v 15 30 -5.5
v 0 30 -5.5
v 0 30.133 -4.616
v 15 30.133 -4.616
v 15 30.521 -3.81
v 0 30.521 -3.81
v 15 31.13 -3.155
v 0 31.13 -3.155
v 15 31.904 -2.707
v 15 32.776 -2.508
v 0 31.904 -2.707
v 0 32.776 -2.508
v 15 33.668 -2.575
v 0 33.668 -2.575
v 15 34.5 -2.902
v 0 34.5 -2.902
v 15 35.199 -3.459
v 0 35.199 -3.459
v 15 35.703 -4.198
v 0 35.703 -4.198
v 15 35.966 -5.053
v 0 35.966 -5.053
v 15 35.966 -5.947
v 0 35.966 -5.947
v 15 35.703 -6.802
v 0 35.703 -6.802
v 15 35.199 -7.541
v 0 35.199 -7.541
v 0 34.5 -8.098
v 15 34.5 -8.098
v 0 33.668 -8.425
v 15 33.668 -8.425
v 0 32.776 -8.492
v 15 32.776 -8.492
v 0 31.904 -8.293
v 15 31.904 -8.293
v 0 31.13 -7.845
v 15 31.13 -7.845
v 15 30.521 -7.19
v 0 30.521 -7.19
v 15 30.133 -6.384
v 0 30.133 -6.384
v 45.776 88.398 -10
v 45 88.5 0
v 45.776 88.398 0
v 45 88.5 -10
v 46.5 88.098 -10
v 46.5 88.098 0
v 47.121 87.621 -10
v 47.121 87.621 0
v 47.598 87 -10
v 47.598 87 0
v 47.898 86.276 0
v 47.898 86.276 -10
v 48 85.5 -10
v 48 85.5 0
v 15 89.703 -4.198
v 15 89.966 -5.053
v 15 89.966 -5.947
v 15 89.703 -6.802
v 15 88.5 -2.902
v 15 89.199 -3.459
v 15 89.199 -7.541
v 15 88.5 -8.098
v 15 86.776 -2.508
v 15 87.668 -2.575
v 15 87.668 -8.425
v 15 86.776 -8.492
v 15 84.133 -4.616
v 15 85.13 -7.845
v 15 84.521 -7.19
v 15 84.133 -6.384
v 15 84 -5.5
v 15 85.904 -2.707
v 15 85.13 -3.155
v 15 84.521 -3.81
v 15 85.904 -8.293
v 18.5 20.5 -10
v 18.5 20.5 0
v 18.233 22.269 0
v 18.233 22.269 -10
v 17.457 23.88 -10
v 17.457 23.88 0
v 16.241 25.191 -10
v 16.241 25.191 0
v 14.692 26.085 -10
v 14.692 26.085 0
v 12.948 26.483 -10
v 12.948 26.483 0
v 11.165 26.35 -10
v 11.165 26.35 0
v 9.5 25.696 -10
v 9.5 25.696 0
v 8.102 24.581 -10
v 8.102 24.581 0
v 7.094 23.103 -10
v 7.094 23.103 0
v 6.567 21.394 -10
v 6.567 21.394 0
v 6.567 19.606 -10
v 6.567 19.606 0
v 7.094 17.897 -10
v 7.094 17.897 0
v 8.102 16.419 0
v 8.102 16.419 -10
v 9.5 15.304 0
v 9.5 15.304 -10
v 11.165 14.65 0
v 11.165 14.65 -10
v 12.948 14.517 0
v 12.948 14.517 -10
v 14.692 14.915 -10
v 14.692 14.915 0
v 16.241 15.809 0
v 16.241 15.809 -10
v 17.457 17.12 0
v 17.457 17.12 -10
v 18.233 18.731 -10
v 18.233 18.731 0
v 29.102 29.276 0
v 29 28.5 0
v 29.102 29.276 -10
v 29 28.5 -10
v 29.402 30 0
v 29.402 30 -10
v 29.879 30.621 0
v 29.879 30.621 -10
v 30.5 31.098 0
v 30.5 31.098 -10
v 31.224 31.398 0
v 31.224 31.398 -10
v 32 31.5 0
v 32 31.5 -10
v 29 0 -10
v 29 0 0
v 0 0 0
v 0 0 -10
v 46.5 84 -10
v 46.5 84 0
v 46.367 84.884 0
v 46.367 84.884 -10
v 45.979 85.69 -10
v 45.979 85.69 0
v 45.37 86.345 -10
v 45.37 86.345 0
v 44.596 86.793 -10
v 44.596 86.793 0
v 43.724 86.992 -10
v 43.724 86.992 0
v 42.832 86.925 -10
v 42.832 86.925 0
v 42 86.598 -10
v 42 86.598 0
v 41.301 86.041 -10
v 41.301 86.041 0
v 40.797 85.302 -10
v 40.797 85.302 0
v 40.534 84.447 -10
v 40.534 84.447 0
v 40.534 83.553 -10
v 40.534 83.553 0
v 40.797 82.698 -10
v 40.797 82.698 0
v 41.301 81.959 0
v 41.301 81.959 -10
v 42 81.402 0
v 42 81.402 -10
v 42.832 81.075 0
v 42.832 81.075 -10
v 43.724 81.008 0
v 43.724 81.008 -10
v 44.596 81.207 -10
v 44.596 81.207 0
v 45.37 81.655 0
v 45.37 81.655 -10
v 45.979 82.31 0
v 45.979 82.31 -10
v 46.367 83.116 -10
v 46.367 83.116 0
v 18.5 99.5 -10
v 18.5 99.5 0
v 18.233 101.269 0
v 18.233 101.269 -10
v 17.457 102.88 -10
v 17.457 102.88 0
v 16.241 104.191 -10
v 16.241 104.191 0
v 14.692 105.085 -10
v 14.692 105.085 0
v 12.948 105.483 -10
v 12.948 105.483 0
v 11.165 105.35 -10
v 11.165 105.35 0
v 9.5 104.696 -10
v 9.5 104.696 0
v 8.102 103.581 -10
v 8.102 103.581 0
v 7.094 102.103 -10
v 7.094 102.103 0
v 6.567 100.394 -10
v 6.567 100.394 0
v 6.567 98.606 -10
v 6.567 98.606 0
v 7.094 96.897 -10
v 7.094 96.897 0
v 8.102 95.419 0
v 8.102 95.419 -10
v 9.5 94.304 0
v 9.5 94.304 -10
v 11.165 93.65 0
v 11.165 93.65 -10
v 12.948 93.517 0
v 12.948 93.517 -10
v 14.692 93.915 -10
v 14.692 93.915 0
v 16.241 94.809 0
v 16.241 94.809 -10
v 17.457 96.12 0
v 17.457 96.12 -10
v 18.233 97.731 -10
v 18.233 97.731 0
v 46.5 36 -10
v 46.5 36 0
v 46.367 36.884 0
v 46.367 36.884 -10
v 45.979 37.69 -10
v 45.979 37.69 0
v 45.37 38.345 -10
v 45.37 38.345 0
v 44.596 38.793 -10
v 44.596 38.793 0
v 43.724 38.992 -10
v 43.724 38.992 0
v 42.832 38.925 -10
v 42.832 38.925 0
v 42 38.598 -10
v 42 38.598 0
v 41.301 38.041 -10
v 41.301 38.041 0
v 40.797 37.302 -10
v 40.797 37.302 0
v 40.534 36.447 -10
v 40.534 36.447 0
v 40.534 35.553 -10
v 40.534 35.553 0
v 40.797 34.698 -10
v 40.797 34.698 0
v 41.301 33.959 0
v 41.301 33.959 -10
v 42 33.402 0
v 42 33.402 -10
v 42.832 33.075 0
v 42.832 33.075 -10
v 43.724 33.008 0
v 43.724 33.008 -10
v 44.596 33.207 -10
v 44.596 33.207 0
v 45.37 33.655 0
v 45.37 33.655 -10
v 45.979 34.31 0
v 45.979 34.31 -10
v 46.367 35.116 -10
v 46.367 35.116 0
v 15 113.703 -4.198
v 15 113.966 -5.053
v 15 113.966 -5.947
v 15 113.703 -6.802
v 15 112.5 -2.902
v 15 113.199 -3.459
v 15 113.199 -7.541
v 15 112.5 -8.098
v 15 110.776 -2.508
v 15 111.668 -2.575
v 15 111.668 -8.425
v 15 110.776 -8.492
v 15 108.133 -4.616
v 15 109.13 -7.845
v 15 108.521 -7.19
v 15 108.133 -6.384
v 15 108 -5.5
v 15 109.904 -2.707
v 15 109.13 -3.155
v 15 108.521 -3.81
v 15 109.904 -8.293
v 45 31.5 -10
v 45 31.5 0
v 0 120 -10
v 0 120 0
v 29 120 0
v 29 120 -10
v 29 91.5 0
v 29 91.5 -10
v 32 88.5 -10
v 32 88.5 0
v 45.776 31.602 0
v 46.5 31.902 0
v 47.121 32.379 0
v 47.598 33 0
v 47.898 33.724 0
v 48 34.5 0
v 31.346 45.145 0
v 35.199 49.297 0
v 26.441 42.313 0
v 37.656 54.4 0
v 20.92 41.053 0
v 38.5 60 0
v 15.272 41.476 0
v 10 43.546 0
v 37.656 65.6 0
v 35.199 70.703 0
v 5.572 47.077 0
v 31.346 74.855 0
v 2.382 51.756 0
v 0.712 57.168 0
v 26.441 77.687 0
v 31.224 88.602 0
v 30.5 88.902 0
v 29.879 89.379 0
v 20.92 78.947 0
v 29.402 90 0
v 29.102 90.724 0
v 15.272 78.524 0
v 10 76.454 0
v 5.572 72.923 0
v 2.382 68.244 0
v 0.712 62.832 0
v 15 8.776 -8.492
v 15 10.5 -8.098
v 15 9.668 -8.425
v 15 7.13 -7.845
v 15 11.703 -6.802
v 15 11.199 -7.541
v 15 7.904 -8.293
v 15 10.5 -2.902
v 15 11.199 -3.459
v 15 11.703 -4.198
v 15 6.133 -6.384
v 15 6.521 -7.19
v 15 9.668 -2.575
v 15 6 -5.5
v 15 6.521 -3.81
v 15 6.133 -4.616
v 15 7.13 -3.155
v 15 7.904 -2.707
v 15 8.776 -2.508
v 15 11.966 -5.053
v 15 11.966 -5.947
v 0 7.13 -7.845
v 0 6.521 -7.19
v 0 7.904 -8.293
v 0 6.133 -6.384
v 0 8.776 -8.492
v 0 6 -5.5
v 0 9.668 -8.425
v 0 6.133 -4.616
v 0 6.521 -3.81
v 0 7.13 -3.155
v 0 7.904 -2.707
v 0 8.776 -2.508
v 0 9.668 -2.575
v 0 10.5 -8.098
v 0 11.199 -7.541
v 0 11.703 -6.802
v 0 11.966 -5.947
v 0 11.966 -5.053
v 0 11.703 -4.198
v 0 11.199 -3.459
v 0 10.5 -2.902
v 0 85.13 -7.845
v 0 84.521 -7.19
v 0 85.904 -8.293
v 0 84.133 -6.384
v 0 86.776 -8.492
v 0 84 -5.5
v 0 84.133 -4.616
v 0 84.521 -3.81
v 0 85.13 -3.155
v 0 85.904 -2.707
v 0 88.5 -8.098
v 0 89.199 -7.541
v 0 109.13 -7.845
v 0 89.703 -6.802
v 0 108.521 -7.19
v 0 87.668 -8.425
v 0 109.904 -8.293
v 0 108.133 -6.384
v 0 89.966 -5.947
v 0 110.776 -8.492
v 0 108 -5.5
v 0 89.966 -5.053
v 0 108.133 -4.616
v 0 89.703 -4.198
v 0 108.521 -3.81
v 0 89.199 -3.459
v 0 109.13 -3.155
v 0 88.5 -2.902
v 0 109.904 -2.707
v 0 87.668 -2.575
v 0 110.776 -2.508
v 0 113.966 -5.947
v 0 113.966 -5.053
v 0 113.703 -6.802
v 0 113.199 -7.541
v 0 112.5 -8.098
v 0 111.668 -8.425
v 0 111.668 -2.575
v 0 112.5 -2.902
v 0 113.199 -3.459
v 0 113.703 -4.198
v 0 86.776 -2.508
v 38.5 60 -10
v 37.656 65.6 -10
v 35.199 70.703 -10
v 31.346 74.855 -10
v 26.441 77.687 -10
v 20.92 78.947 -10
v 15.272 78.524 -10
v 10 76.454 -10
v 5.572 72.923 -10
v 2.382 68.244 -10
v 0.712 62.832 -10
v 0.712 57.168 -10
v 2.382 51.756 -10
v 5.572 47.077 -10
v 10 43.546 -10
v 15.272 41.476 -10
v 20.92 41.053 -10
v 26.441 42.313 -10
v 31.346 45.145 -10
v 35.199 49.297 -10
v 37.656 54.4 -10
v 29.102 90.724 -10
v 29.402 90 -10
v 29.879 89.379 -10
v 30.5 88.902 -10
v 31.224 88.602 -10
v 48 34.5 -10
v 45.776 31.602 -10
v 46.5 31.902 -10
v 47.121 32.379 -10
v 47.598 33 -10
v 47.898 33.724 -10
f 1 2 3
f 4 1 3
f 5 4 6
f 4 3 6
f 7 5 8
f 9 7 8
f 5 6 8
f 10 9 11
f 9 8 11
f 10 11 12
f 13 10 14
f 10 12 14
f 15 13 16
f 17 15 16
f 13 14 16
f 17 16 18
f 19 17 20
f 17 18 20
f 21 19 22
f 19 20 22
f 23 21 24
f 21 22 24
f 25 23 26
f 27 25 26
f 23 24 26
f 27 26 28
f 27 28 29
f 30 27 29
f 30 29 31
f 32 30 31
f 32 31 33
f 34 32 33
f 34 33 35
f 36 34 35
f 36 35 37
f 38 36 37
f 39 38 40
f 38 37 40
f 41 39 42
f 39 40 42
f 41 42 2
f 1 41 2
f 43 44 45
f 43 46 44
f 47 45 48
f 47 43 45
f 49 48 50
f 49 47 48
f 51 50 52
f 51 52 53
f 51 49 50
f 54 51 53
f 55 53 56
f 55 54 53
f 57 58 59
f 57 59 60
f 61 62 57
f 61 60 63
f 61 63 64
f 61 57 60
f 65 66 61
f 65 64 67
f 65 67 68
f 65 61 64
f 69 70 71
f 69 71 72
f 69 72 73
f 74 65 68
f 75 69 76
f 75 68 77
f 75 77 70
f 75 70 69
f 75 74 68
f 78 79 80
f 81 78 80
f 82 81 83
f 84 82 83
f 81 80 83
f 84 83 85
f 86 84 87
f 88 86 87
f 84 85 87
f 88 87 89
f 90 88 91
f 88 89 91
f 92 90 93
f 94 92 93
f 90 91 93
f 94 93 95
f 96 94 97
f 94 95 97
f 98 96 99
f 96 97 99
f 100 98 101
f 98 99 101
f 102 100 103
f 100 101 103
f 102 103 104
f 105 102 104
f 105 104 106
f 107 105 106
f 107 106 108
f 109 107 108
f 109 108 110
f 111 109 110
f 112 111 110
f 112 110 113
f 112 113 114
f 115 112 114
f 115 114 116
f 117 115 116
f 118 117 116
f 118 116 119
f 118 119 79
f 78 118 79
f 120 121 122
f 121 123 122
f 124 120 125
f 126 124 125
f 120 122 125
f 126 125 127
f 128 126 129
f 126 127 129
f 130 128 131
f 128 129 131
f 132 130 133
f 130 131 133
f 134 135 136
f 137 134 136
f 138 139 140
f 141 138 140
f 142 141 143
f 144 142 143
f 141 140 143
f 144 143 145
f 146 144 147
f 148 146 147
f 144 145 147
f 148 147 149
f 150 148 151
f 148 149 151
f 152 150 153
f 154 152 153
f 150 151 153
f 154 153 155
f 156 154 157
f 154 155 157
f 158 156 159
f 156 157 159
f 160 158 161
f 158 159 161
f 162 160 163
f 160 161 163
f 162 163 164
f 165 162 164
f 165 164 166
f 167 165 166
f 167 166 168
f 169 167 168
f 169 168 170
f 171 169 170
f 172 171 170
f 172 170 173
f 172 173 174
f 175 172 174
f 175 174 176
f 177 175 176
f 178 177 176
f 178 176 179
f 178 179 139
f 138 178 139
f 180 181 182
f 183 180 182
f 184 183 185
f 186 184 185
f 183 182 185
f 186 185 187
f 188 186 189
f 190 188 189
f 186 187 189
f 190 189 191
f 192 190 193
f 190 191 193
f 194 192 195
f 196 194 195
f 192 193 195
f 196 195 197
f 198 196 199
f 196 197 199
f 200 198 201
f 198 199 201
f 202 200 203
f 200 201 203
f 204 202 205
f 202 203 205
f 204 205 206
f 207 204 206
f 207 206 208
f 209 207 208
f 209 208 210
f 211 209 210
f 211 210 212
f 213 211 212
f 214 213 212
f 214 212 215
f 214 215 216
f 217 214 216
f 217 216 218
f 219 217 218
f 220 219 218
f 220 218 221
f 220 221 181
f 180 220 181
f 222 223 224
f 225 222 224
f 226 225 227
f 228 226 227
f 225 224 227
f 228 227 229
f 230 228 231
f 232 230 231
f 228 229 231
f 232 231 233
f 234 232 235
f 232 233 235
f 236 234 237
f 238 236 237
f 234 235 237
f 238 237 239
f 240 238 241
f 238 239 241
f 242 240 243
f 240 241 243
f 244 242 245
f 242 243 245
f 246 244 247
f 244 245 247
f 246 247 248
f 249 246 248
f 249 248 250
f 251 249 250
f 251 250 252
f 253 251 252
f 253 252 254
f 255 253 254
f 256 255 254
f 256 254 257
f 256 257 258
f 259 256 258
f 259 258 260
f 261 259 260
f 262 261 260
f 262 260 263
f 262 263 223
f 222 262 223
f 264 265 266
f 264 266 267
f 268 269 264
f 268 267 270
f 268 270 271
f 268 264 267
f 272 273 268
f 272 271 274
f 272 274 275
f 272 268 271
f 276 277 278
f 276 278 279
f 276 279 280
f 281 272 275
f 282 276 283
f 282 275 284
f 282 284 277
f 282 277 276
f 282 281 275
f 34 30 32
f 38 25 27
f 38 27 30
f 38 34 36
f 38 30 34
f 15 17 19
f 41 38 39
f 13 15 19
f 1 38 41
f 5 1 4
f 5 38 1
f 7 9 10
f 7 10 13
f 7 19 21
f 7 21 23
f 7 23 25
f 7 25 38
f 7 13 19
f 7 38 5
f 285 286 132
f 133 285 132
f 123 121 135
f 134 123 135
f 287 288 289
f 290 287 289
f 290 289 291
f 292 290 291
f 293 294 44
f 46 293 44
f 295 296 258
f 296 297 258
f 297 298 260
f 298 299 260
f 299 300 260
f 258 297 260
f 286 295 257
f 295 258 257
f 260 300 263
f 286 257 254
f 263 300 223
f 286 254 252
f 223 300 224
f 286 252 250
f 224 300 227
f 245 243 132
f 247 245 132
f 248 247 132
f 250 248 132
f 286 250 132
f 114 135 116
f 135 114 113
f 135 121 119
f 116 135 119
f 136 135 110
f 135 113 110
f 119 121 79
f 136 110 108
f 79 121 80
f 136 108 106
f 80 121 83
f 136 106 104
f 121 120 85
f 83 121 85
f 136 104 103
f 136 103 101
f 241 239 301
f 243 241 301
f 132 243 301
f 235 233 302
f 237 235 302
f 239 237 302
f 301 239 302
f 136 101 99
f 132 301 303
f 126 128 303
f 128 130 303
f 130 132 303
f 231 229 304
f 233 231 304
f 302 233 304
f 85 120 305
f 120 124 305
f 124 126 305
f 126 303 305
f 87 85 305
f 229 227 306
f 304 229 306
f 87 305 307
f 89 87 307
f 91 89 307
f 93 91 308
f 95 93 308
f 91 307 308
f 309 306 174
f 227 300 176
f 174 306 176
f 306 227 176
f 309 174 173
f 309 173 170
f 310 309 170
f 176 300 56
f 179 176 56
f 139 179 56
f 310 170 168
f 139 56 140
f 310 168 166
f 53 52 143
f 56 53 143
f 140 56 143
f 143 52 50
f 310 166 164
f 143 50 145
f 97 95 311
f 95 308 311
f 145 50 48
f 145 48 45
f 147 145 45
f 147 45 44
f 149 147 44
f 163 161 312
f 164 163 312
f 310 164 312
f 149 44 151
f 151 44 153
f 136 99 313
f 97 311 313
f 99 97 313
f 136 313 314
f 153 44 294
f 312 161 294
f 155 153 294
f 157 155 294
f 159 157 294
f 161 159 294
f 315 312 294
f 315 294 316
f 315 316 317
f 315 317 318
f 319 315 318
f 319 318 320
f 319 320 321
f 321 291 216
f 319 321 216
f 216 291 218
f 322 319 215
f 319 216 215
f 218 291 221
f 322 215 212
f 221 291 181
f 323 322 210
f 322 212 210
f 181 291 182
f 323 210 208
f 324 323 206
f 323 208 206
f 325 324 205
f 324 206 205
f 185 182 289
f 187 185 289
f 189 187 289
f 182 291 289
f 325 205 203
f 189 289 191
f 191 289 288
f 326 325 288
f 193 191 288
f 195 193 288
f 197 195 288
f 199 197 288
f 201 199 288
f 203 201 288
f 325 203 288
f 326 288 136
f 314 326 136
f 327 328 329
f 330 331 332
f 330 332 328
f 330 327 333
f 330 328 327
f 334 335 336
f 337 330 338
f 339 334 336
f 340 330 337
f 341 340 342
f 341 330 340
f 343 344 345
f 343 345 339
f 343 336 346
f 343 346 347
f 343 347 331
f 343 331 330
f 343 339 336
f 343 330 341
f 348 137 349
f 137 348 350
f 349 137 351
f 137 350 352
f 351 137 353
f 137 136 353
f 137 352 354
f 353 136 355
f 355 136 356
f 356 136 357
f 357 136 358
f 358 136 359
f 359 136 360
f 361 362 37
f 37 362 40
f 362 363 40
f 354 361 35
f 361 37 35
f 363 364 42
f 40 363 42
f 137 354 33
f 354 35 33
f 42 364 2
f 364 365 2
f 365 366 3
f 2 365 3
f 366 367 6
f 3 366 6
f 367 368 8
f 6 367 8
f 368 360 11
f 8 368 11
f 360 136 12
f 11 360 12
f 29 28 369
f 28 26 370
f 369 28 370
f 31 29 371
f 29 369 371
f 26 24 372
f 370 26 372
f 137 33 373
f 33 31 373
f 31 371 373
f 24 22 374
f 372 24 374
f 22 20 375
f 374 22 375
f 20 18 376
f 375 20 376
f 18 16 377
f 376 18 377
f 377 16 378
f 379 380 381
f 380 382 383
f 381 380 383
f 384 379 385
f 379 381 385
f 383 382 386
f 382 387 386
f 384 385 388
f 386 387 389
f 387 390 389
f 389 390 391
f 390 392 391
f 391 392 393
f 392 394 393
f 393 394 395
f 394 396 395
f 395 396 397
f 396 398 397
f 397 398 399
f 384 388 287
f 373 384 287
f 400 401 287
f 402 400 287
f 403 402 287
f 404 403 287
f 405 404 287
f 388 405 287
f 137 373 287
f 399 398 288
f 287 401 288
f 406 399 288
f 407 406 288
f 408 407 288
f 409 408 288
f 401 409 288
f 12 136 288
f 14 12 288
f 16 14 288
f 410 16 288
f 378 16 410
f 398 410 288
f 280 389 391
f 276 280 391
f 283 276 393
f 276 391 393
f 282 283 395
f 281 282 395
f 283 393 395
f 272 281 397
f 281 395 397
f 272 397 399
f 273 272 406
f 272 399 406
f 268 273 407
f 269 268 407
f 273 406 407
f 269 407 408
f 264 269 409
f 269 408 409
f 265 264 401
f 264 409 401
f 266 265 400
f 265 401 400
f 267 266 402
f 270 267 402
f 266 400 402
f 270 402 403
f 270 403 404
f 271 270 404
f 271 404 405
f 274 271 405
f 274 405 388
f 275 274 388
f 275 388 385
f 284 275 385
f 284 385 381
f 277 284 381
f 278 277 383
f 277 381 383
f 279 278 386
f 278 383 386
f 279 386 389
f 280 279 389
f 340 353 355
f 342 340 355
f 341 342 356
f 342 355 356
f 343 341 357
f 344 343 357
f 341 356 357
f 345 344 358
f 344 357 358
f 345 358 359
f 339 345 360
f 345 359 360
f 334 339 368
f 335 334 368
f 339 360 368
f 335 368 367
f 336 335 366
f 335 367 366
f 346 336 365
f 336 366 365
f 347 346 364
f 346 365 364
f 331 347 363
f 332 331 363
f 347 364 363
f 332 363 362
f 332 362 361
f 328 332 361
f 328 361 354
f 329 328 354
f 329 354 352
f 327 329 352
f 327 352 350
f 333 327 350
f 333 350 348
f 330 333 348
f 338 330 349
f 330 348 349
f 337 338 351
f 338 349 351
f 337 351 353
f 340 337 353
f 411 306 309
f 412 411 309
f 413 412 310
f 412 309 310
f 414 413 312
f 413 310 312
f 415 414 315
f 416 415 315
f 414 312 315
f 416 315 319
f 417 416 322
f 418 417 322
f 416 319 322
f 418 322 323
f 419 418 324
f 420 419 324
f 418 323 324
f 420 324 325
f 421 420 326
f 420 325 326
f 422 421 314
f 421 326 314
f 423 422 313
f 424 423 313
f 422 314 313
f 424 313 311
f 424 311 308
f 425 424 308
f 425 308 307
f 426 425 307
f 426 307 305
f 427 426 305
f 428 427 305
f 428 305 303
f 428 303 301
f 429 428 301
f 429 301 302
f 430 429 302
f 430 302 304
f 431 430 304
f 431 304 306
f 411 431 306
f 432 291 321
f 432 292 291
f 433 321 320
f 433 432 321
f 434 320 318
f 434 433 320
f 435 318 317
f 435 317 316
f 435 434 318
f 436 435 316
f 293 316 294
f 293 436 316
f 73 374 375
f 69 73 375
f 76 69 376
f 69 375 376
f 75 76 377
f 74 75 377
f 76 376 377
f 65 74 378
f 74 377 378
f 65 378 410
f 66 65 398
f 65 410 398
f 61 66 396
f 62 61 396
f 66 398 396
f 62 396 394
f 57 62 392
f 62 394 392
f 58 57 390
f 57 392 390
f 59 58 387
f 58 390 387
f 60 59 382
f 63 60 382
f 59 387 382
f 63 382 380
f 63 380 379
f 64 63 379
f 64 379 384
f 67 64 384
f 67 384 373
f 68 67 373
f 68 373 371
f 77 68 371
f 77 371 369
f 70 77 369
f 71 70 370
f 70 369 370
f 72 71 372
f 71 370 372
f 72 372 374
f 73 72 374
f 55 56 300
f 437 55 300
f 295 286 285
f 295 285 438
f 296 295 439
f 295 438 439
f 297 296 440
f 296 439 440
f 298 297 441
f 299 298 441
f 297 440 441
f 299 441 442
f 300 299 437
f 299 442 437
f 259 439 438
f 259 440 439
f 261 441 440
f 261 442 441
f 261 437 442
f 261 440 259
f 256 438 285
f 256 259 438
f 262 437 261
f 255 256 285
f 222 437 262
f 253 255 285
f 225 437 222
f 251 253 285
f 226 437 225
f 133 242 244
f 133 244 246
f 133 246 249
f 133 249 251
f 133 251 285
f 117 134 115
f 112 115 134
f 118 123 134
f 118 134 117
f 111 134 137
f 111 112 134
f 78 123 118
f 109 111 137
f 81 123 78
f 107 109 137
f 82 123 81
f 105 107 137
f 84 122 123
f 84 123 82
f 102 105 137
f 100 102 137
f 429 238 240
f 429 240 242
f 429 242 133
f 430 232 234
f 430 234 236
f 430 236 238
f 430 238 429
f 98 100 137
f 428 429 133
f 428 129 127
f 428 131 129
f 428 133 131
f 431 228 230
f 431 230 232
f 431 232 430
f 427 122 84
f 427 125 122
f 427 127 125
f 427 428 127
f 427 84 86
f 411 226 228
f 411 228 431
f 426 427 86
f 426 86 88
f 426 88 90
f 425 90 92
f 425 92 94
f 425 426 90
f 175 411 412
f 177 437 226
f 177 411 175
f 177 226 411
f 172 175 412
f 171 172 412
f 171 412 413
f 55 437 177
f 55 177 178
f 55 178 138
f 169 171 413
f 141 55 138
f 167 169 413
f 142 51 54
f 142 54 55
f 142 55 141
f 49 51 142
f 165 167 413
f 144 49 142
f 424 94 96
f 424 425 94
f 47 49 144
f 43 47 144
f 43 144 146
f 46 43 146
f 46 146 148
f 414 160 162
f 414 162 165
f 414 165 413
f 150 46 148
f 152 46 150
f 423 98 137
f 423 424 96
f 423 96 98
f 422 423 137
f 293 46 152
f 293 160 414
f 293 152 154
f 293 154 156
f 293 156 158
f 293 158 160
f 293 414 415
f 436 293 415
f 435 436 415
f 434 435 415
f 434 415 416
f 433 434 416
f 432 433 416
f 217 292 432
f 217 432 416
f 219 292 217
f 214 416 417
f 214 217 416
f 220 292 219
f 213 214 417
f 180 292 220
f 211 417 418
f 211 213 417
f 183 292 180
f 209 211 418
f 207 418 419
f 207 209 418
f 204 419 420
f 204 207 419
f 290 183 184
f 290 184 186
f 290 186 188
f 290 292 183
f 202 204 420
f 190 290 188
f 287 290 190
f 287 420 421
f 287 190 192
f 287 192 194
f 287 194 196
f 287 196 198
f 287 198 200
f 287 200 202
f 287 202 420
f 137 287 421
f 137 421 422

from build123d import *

# Parameters (mm, degrees)
PAD_DEPTH       = 10
SKETCH001_R     = 19
POCKET_DEPTH    = 10.001
SKETCH002_R     = 6
POCKET001_DEPTH = 10.001
FILLET_R        = 3
SKETCH003_R     = 3
POCKET002_DEPTH = 15
SKETCH004_R     = 3
POCKET003_DEPTH = 10.001


with BuildPart() as part:
    # Sketch → Pad (new body)
    with BuildSketch(Plane.XY):
        Polygon((0, 0), (0, 120), (29, 120), (29, 88.5), (48, 88.5), (48, 31.5), (29, 31.5), (29, 0), align=None)
    extrude(amount=-PAD_DEPTH)

    # Sketch001 → Pocket (cut, through all)
    with BuildSketch(Plane.XY):
        with Locations((19.5, 60)):
            Circle(SKETCH001_R)
    extrude(amount=-POCKET_DEPTH, mode=Mode.SUBTRACT)

    # Sketch002 → Pocket001 (cut, through all)
    with BuildSketch(Plane.XY):
        with Locations((12.5, 99.5)):
            Circle(SKETCH002_R)
        with Locations((12.5, 20.5)):
            Circle(SKETCH002_R)
    extrude(amount=-POCKET001_DEPTH, mode=Mode.SUBTRACT)

    # Fillet
    fillet_edges = [part.edges().sort_by_distance(p)[0] for p in [
        (29, 31.5, -5),
        (29, 88.5, -5),
        (48, 31.5, -5),
        (48, 88.5, -5),
    ]]
    fillet(fillet_edges, radius=FILLET_R)

    # Sketch003 → Pocket002 (cut)
    with BuildSketch(Plane(origin=(0, 0, 0), x_dir=(0, -1, 0), z_dir=(-1, 0, 0))):
        with Locations((-111, -5.5)):
            Circle(SKETCH003_R)
        with Locations((-87, -5.5)):
            Circle(SKETCH003_R)
        with Locations((-33, -5.5)):
            Circle(SKETCH003_R)
        with Locations((-9, -5.5)):
            Circle(SKETCH003_R)
    extrude(amount=-POCKET002_DEPTH, mode=Mode.SUBTRACT)

    # Sketch004 → Pocket003 (cut, through all)
    with BuildSketch(Plane.XY):
        with Locations((43.5, 84)):
            Circle(SKETCH004_R)
        with Locations((43.5, 36)):
            Circle(SKETCH004_R)
    extrude(amount=-POCKET003_DEPTH, mode=Mode.SUBTRACT)


solid = part.part
